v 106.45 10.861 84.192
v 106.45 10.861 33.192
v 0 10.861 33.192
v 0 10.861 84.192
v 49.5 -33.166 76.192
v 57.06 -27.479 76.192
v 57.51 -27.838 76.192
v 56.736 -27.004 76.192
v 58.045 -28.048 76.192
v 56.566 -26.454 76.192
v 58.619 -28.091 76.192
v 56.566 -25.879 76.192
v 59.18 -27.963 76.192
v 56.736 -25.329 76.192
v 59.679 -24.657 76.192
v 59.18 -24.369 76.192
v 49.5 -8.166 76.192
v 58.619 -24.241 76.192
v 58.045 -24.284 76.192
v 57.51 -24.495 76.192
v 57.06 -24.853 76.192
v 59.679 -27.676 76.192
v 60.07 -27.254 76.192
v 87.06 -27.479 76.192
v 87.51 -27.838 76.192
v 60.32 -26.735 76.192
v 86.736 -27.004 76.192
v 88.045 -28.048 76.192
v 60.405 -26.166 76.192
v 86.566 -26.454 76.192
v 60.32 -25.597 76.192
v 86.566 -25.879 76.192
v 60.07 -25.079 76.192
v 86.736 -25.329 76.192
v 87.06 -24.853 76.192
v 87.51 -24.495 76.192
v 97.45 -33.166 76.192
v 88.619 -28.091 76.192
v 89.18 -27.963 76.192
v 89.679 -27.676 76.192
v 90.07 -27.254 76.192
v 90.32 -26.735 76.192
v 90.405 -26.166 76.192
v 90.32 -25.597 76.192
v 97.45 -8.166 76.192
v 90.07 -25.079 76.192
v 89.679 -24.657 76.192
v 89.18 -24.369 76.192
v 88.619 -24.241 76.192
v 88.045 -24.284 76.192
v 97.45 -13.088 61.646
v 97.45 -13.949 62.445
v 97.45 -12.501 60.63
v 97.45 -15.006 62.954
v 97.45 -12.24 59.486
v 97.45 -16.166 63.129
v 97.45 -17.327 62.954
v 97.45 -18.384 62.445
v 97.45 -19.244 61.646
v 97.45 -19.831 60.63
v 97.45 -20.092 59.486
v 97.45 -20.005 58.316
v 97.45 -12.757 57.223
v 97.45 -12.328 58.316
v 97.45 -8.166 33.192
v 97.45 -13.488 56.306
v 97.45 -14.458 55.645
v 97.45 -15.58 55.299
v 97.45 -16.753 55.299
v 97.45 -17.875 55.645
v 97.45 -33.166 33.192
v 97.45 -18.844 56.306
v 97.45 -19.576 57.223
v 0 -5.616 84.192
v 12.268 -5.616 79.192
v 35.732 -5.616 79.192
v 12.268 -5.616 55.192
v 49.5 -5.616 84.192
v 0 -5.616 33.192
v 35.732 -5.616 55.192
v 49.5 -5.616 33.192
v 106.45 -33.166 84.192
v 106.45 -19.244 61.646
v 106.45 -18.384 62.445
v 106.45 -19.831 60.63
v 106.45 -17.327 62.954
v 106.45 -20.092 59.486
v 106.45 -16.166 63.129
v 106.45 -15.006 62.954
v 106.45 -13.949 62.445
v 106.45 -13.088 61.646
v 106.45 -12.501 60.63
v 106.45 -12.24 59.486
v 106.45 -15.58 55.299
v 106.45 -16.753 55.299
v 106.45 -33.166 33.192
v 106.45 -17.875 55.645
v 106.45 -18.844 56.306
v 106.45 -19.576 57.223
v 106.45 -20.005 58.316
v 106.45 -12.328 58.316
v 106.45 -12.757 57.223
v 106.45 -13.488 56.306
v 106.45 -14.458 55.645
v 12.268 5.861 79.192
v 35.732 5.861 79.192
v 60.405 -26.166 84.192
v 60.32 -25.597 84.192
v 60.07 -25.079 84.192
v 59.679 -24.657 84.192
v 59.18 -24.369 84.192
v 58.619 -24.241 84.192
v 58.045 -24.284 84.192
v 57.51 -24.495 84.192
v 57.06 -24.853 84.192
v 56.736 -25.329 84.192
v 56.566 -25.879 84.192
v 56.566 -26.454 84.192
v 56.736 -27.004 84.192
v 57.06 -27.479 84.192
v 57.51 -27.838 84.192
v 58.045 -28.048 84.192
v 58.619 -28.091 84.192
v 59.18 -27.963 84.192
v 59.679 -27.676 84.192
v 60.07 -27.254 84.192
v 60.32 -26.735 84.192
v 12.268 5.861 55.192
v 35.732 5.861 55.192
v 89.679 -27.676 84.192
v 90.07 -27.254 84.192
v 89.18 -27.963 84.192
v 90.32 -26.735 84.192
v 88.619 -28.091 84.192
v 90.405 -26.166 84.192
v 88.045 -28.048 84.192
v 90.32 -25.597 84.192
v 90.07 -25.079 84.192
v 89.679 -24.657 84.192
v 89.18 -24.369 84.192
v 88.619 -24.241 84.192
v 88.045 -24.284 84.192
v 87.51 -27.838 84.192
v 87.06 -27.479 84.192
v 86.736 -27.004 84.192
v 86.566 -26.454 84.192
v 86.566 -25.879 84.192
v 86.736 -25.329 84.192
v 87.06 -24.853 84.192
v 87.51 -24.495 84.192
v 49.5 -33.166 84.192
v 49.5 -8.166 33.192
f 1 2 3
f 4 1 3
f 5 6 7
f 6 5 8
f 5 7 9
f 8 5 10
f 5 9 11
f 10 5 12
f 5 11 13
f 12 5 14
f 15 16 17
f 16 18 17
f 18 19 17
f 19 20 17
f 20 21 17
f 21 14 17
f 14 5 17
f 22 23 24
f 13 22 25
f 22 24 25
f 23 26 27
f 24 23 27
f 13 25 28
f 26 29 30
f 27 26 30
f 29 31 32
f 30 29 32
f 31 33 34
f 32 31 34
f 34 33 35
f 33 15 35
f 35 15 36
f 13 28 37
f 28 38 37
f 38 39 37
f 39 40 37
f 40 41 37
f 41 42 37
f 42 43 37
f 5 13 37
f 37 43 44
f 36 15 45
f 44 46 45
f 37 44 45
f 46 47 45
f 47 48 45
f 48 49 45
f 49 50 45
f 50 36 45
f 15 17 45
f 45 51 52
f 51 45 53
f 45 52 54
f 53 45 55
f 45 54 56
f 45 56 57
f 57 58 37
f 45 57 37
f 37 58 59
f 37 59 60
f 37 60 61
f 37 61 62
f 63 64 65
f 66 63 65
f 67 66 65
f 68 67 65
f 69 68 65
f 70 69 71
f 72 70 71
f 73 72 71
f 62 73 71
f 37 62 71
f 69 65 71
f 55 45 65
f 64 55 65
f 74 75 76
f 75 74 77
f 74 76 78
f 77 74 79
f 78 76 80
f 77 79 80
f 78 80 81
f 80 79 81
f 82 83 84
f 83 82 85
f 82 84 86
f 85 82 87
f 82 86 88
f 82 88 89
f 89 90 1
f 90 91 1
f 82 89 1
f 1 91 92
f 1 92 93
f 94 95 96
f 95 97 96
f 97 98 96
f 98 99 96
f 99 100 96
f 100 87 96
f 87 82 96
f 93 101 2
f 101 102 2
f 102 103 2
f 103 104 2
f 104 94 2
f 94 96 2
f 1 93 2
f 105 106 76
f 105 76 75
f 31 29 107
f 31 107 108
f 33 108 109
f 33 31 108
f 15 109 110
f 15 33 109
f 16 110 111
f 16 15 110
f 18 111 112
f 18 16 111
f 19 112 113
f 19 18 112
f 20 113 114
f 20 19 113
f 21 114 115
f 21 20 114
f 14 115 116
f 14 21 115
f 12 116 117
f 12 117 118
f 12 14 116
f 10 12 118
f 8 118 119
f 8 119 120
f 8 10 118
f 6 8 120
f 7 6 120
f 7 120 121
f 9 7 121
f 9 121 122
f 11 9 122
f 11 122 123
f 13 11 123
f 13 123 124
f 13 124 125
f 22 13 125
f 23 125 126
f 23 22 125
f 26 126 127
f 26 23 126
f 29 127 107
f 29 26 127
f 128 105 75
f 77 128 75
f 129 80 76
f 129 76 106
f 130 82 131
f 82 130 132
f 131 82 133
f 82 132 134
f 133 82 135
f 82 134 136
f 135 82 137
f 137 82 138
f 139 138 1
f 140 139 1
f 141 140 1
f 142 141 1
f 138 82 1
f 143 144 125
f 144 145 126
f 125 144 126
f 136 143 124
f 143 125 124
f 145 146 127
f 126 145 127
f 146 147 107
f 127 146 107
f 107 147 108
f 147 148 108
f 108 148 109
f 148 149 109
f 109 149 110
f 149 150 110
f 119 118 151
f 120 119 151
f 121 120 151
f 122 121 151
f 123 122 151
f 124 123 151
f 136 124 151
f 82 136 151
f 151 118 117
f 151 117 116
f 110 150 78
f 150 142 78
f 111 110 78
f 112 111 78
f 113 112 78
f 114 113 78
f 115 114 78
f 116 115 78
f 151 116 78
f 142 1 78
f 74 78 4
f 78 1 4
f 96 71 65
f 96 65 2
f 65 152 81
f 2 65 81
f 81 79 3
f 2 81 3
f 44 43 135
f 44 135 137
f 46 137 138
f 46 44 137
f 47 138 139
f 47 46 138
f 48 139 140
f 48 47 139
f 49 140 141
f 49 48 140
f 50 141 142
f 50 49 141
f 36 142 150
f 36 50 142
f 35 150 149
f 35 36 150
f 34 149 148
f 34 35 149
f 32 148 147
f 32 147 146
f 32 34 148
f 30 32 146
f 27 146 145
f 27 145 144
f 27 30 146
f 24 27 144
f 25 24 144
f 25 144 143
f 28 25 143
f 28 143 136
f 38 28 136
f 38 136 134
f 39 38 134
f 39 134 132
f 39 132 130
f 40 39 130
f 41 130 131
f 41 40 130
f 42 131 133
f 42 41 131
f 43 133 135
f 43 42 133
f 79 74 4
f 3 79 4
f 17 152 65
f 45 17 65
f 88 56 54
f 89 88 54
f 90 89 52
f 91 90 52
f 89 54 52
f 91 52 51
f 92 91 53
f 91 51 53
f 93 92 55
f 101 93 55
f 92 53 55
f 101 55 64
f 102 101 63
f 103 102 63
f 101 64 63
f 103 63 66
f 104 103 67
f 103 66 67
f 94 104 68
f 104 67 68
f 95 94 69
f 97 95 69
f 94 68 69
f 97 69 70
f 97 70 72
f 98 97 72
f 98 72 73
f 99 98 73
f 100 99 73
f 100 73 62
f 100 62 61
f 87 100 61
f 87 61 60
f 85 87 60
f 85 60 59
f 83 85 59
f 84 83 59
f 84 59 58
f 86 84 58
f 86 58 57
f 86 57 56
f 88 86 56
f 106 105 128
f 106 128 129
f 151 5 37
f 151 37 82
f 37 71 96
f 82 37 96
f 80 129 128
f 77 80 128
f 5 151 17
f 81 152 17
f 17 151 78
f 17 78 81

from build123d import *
from build123d.topology import SkipClean

# Parameters (mm, degrees)
SKETCH1_W             = 48
SKETCH1_H             = 53
BOSS_EXTRUDE1_DEPTH   = 10
SKETCH2_W             = 48
SKETCH2_H             = 5.616325
BOSS_EXTRUDE2_DEPTH   = 33.1917878
SKETCH4_W             = 4
SKETCH4_H             = 10
BOSS_EXTRUDE4_DEPTH   = 40
SKETCH5_W             = 48
SKETCH5_H             = 10.8609375
BOSS_EXTRUDE5_DEPTH   = 23.1917878
SKETCH6_W             = 48
SKETCH6_H             = 5
BOSS_EXTRUDE6_DEPTH   = 42.3
SKETCH7_W             = 12.8082122
SKETCH7_H             = 16.4772625
BOSS_EXTRUDE7_DEPTH   = 48
CUT_EXTRUDE1_REACH    = 84.426
SKETCH8_R             = 11.5
SKETCH8_R_2           = 2
FILLET1_R             = 10
FILLET2_R             = 4
SKETCH9_W             = 5
SKETCH9_H             = 16.4772625
BOSS_EXTRUDE9_DEPTH   = 48
CUT_EXTRUDE2_DEPTH    = 88.252507127
SKETCH11_W            = 51
SKETCH11_H            = 16.4772625
BOSS_EXTRUDE10_DEPTH  = 49.45
BOSS_EXTRUDE11_DEPTH  = 46
SKETCH16_W            = 47.95
SKETCH16_H            = 51
BOSS_EXTRUDE14_DEPTH  = 2.55
SKETCH14_W            = 5
SKETCH14_H            = 42.3
BOSS_EXTRUDE13_DEPTH  = 1.5
SKETCH17_W            = 51
SKETCH17_H            = 19.0272625
BOSS_EXTRUDE15_DEPTH  = 9
BOSS_EXTRUDE16_DEPTH  = 25
SKETCH19_R            = 1.9304
CUT_EXTRUDE3_DEPTH    = 125.404890183
MIRROR2_START         = 33.1917878
MIRROR2_DEPTH         = 51
MIRROR2_START_2       = 76.1917878
MIRROR2_2_OUTLINE_W   = 47.95
MIRROR2_2_OUTLINE_H   = 25
MIRROR2_2_OUTLINE_R   = 1.9304
MIRROR2_2_DEPTH       = 8
MIRROR2_3_OUTLINE_W   = 45
MIRROR2_3_OUTLINE_H   = 42.3
MIRROR2_3_OUTLINE_R   = 2
MIRROR2_3_OUTLINE_R_2 = 11.5
MIRROR2_3_DEPTH       = 5
SKETCH20_W            = 103.287975037
SKETCH20_H            = 97.84889924
CUT_EXTRUDE4_DEPTH    = 144.929961559
SKETCH21_W            = 49.5
SKETCH21_H            = 42.3
CUT_EXTRUDE5_DEPTH    = 128.391431036
SKETCH24_R            = 7.5
BOSS_EXTRUDE18_DEPTH  = 45
BOSS_EXTRUDE19_DEPTH  = 29
SKETCH26_R            = 3.937
CUT_EXTRUDE6_DEPTH    = 135.023808387
CUT_EXTRUDE7_DEPTH    = 24
CUT_EXTRUDE8_DEPTH    = 135.852601315
CUT_EXTRUDE9_REACH    = 125.734


# Read off the part's stored shape, not the designer's step: Mirror2
with BuildPart() as part:
    # Sketch1 → Boss-Extrude1 (new body)
    with BuildSketch(Plane.XY):
        with Locations((24, 26.5)):
            Rectangle(SKETCH1_W, SKETCH1_H)
    extrude(amount=BOSS_EXTRUDE1_DEPTH)

    # Sketch2 → Boss-Extrude2 (add)
    with BuildSketch(Plane(origin=(0, 0, 0), x_dir=(-1, 0, 0), z_dir=(0, 0, -1))):
        with Locations((-24, -2.8081625)):
            Rectangle(SKETCH2_W, SKETCH2_H)
    extrude(amount=-BOSS_EXTRUDE2_DEPTH)

    # Sketch4 → Boss-Extrude4 (add)
    with BuildSketch(Plane.XY.offset(10)):
        with Locations((2, 48)):
            Rectangle(SKETCH4_W, SKETCH4_H)
        with Locations((46, 48)):
            Rectangle(SKETCH4_W, SKETCH4_H)
    extrude(amount=BOSS_EXTRUDE4_DEPTH)

    # Sketch5 → Boss-Extrude5 (add)
    with BuildSketch(Plane.XY.offset(10)):
        with Locations((24, 5.43046875)):
            Rectangle(SKETCH5_W, SKETCH5_H)
    extrude(amount=BOSS_EXTRUDE5_DEPTH)

    # Sketch6 → Boss-Extrude6 (add)
    with BuildSketch(Plane.XZ.offset(5.616325)):
        with Locations((24, 30.6917878)):
            Rectangle(SKETCH6_W, SKETCH6_H)
    extrude(amount=BOSS_EXTRUDE6_DEPTH)

    # Sketch7 → Boss-Extrude7 (add)
    with BuildSketch(Plane.ZY):
        with Locations((-6.4041061, 2.62230625)):
            Rectangle(SKETCH7_W, SKETCH7_H)
    extrude(amount=-BOSS_EXTRUDE7_DEPTH)

    # Sketch8 → Cut-Extrude1 (cut, up to next)
    with BuildSketch(Plane(origin=(0, 0, 28.1917878), x_dir=(-1, 0, 0), z_dir=(0, 0, -1)), mode=Mode.PRIVATE) as cut_extrude1_sk1:
        with Locations((-24, -26.616325)):
            Circle(SKETCH8_R)
    cut_extrude1_tool1 = extrude(cut_extrude1_sk1.sketch, amount=-CUT_EXTRUDE1_REACH, mode=Mode.PRIVATE) & part.part
    # Sketch8 → Cut-Extrude1 (cut, up to next)
    with BuildSketch(Plane(origin=(0, 0, 28.1917878), x_dir=(-1, 0, 0), z_dir=(0, 0, -1)), mode=Mode.PRIVATE) as cut_extrude1_sk2:
        with Locations((-39.5, -11.116325)):
            Circle(SKETCH8_R_2)
    cut_extrude1_tool2 = extrude(cut_extrude1_sk2.sketch, amount=-CUT_EXTRUDE1_REACH, mode=Mode.PRIVATE) & part.part
    # Sketch8 → Cut-Extrude1 (cut, up to next)
    with BuildSketch(Plane(origin=(0, 0, 28.1917878), x_dir=(-1, 0, 0), z_dir=(0, 0, -1)), mode=Mode.PRIVATE) as cut_extrude1_sk3:
        with Locations((-39.5, -42.116325)):
            Circle(SKETCH8_R_2)
    cut_extrude1_tool3 = extrude(cut_extrude1_sk3.sketch, amount=-CUT_EXTRUDE1_REACH, mode=Mode.PRIVATE) & part.part
    # Sketch8 → Cut-Extrude1 (cut, up to next)
    with BuildSketch(Plane(origin=(0, 0, 28.1917878), x_dir=(-1, 0, 0), z_dir=(0, 0, -1)), mode=Mode.PRIVATE) as cut_extrude1_sk4:
        with Locations((-8.5, -11.116325)):
            Circle(SKETCH8_R_2)
    cut_extrude1_tool4 = extrude(cut_extrude1_sk4.sketch, amount=-CUT_EXTRUDE1_REACH, mode=Mode.PRIVATE) & part.part
    # Sketch8 → Cut-Extrude1 (cut, up to next)
    with BuildSketch(Plane(origin=(0, 0, 28.1917878), x_dir=(-1, 0, 0), z_dir=(0, 0, -1)), mode=Mode.PRIVATE) as cut_extrude1_sk5:
        with Locations((-8.5, -42.116325)):
            Circle(SKETCH8_R_2)
    cut_extrude1_tool5 = extrude(cut_extrude1_sk5.sketch, amount=-CUT_EXTRUDE1_REACH, mode=Mode.PRIVATE) & part.part
    add(cut_extrude1_tool1.solids().sort_by_distance((24, -26.616325, 28.191788))[0], mode=Mode.SUBTRACT)
    add(cut_extrude1_tool2.solids().sort_by_distance((39.5, -11.116325, 28.191788))[0], mode=Mode.SUBTRACT)
    add(cut_extrude1_tool3.solids().sort_by_distance((39.5, -42.116325, 28.191788))[0], mode=Mode.SUBTRACT)
    add(cut_extrude1_tool4.solids().sort_by_distance((8.5, -11.116325, 28.191788))[0], mode=Mode.SUBTRACT)
    add(cut_extrude1_tool5.solids().sort_by_distance((8.5, -42.116325, 28.191788))[0], mode=Mode.SUBTRACT)

    # Fillet1
    fillet1_edges = [part.edges().sort_by_distance(p)[0] for p in [
        (24, 10.8609375, 0),
    ]]
    fillet(fillet1_edges, radius=FILLET1_R)

    # Fillet2
    fillet2_edges = [part.edges().sort_by_distance(p)[0] for p in [
        (2, 43, 10),
        (46, 43, 10),
    ]]
    fillet(fillet2_edges, radius=FILLET2_R)

    # Sketch9 → Boss-Extrude9 (add)
    with BuildSketch(Plane(origin=(48, 0, 0), x_dir=(0, 0, -1), z_dir=(1, 0, 0))):
        with Locations((15.3082122, 2.62230625)):
            Rectangle(SKETCH9_W, SKETCH9_H)
    extrude(amount=-BOSS_EXTRUDE9_DEPTH)

    # Sketch10 → Cut-Extrude2 (cut, through all)
    with BuildSketch(Plane(origin=(48, 0, 0), x_dir=(0, 0, -1), z_dir=(1, 0, 0))):
        Polygon((17.8082122, 10.8609375), (-33.1917878, 10.8609375), (-76.887145623, 43.902095521), (-50.794096938, 74.436514195), (27.207463492, 71.105486703), align=None)
    extrude(amount=-CUT_EXTRUDE2_DEPTH, mode=Mode.SUBTRACT)

    # Sketch11 → Boss-Extrude10 (add)
    with BuildSketch(Plane(origin=(48, 0, 0), x_dir=(0, 0, -1), z_dir=(1, 0, 0))):
        with Locations((-7.6917878, 2.62230625)):
            Rectangle(SKETCH11_W, SKETCH11_H)
    extrude(amount=BOSS_EXTRUDE10_DEPTH)

    # Sketch12 → Boss-Extrude11 (add)
    with BuildSketch(Plane(origin=(0, 0, 28.1917878), x_dir=(-1, 0, 0), z_dir=(0, 0, -1))):
        Polygon((-48, -47.916325), (-45, -47.916325), (-45, -5.616325), (-49.5, -5.616325), (-49.5, -47.916325), align=None)
    extrude(amount=BOSS_EXTRUDE11_DEPTH)

    # Sketch16 → Boss-Extrude14 (add)
    with BuildSketch(Plane.XZ.offset(5.616325)):
        with Locations((73.475, 7.6917878)):
            Rectangle(SKETCH16_W, SKETCH16_H)
    extrude(amount=BOSS_EXTRUDE14_DEPTH)

    # Sketch14 → Boss-Extrude13 (add)
    with BuildSketch(Plane(origin=(49.5, 0, 0), x_dir=(0, 0, -1), z_dir=(1, 0, 0))):
        with Locations((-30.6917878, -26.766325)):
            Rectangle(SKETCH14_W, SKETCH14_H)
    extrude(amount=-BOSS_EXTRUDE13_DEPTH)

    # Sketch17 → Boss-Extrude15 (add)
    with BuildSketch(Plane(origin=(97.45, 0, 0), x_dir=(0, 0, -1), z_dir=(1, 0, 0))):
        with Locations((-7.6917878, 1.34730625)):
            Rectangle(SKETCH17_W, SKETCH17_H)
    extrude(amount=BOSS_EXTRUDE15_DEPTH)

    # Sketch18 → Boss-Extrude16 (add)
    with BuildSketch(Plane.XZ.offset(8.166325)):
        Polygon((49.5, -17.8082122), (106.45, -17.8082122), (106.45, -9.8082122), (106.45, 33.1917878), (97.45, 33.1917878), (97.45, -9.8082122), (49.5, -9.8082122), align=None)
    extrude(amount=BOSS_EXTRUDE16_DEPTH)

    # Sketch19 → Cut-Extrude3 (cut, through all)
    with BuildSketch(Plane.XY.offset(-9.8082122)):
        with Locations((58.475, -26.166325)):
            Circle(SKETCH19_R)
        with Locations((88.475, -26.166325)):
            Circle(SKETCH19_R)
    extrude(amount=-CUT_EXTRUDE3_DEPTH, mode=Mode.SUBTRACT)

    # Mirror2 outline → Mirror2 (add)
    with BuildSketch(Plane.XY.offset(MIRROR2_START)):
        Polygon((49.5, -47.916325), (49.5, -8.166325), (97.45, -8.166325), (97.45, -33.166325), (106.45, -33.166325), (106.45, 10.8609375), (0, 10.8609375), (0, -5.616325), (45, -5.616325), (45, -47.916325), align=None)
    extrude(amount=MIRROR2_DEPTH)

    # Mirror2 2 outline → Mirror2 2 (add)
    with BuildSketch(Plane.XY.offset(MIRROR2_START_2)):
        with Locations((73.475, -20.666325)):
            Rectangle(MIRROR2_2_OUTLINE_W, MIRROR2_2_OUTLINE_H)
        with Locations((58.475, -26.166325)):
            Circle(MIRROR2_2_OUTLINE_R, mode=Mode.SUBTRACT)
        with Locations((88.475, -26.166325)):
            Circle(MIRROR2_2_OUTLINE_R, mode=Mode.SUBTRACT)
    extrude(amount=MIRROR2_2_DEPTH)

    # Mirror2 3 outline → Mirror2 3 (add)
    with SkipClean():  # the faces are left unmerged after this step: merging them gives an invalid solid
        with BuildSketch(Plane.XY.offset(MIRROR2_START)):
            with Locations((22.5, -26.766325)):
                Rectangle(MIRROR2_3_OUTLINE_W, MIRROR2_3_OUTLINE_H)
            with Locations((8.5, -42.116325)):
                Circle(MIRROR2_3_OUTLINE_R, mode=Mode.SUBTRACT)
            with Locations((39.5, -42.116325)):
                Circle(MIRROR2_3_OUTLINE_R, mode=Mode.SUBTRACT)
            with Locations((24, -26.616325)):
                Circle(MIRROR2_3_OUTLINE_R_2, mode=Mode.SUBTRACT)
            with Locations((8.5, -11.116325)):
                Circle(MIRROR2_3_OUTLINE_R, mode=Mode.SUBTRACT)
            with Locations((39.5, -11.116325)):
                Circle(MIRROR2_3_OUTLINE_R, mode=Mode.SUBTRACT)
        extrude(amount=MIRROR2_3_DEPTH)

    # Sketch20 → Cut-Extrude4 (cut, through all)
    with BuildSketch(Plane.ZY):
        with Locations((-18.452199719, -38.06351212)):
            Rectangle(SKETCH20_W, SKETCH20_H)
    extrude(amount=-CUT_EXTRUDE4_DEPTH, mode=Mode.SUBTRACT)

    # Sketch21 → Cut-Extrude5 (cut, through all)
    with BuildSketch(Plane.XY.offset(84.1917878)):
        with Locations((24.75, -26.766325)):
            Rectangle(SKETCH21_W, SKETCH21_H)
    extrude(amount=-CUT_EXTRUDE5_DEPTH, mode=Mode.SUBTRACT)



with BuildPart() as body_2:
    # Sketch24 → Boss-Extrude18 (new body)
    with BuildSketch(Plane.XY.offset(55.1917878)):
        with Locations((24, -29.616325)):
            Circle(SKETCH24_R)
    extrude(amount=-BOSS_EXTRUDE18_DEPTH)


with BuildPart() as part_1:
    add(part.part)

    add(body_2.part)  # Boss-Extrude19 merges body 2
    # Sketch25 → Boss-Extrude19 (add)
    with BuildSketch(Plane.XY.offset(55.1917878)):
        with BuildLine():
            Line((16.5, -29.616325), (12.268152463, -5.616325))
            Line((12.268152463, -5.616325), (35.731847537, -5.616325))
            Line((35.731847537, -5.616325), (31.5, -29.616325))
            ThreePointArc((31.5, -29.616325), (24, -37.116325), (16.5, -29.616325))
        make_face()
    extrude(amount=BOSS_EXTRUDE19_DEPTH)

    # Sketch26 → Cut-Extrude6 (cut, through all)
    with BuildSketch(Plane.ZY.offset(-97.45)):
        with Locations((59.1917878, -16.166325)):
            Circle(SKETCH26_R)
    extrude(amount=-CUT_EXTRUDE6_DEPTH, mode=Mode.SUBTRACT)

    # Sketch27 → Cut-Extrude7 (cut)
    with BuildSketch(Plane.XY.offset(79.1917878)):
        Polygon((12.268152463, -5.616325), (12.268152463, 5.8609375), (35.731847537, 5.8609375), (35.731847537, -5.616325), (35.731847537, -46.734959709), (12.268152463, -46.734959709), align=None)
    extrude(amount=-CUT_EXTRUDE7_DEPTH, mode=Mode.SUBTRACT)


with BuildPart() as cut_extrude7_piece_1:
    # of the separate pieces the step leaves, piece 1, a body of its own (cut_extrude7_pieces)
    add(part_1.part.solids().sort_by_distance((97.45, -8.166325, 33.1917878))[0])

    # Sketch29 → Cut-Extrude9 (cut, up to next)
    with BuildSketch(Plane.XY.offset(84.1917878), mode=Mode.PRIVATE) as cut_extrude9_sk1:
        with BuildLine():
            Line((12.268152463, -5.616325), (35.731847537, -5.616325))
            Line((35.731847537, -5.616325), (31.5, -29.616325))
            ThreePointArc((31.5, -29.616325), (24, -37.116325), (16.5, -29.616325))
            Line((16.5, -29.616325), (12.268152463, -5.616325))
        make_face()
    cut_extrude9_tool1 = extrude(cut_extrude9_sk1.sketch, amount=-CUT_EXTRUDE9_REACH, mode=Mode.PRIVATE) & cut_extrude7_piece_1.part
    add(cut_extrude9_tool1.solids().sort_by_distance((24, -19.317077, 84.191788))[0], mode=Mode.SUBTRACT)


with BuildPart() as cut_extrude7_piece_2:
    # of the separate pieces the step leaves, piece 2, a body of its own (cut_extrude7_pieces)
    add(part_1.part.solids().sort_by_distance((31.5, -29.616325, 55.1917878))[0])

    # Sketch28 → Cut-Extrude8 (cut, through all)
    with BuildSketch(Plane(origin=(0, 0, 10.1917878), x_dir=(-1, 0, 0), z_dir=(0, 0, -1))):
        with BuildLine():
            Line((-31.5, -29.616325), (-35.731847537, -5.616325))
            Line((-35.731847537, -5.616325), (-12.268152463, -5.616325))
            Line((-12.268152463, -5.616325), (-16.5, -29.616325))
            ThreePointArc((-16.5, -29.616325), (-24, -37.116325), (-31.5, -29.616325))
        make_face()
    extrude(amount=-CUT_EXTRUDE8_DEPTH, mode=Mode.SUBTRACT)


solid = cut_extrude7_piece_1.part
